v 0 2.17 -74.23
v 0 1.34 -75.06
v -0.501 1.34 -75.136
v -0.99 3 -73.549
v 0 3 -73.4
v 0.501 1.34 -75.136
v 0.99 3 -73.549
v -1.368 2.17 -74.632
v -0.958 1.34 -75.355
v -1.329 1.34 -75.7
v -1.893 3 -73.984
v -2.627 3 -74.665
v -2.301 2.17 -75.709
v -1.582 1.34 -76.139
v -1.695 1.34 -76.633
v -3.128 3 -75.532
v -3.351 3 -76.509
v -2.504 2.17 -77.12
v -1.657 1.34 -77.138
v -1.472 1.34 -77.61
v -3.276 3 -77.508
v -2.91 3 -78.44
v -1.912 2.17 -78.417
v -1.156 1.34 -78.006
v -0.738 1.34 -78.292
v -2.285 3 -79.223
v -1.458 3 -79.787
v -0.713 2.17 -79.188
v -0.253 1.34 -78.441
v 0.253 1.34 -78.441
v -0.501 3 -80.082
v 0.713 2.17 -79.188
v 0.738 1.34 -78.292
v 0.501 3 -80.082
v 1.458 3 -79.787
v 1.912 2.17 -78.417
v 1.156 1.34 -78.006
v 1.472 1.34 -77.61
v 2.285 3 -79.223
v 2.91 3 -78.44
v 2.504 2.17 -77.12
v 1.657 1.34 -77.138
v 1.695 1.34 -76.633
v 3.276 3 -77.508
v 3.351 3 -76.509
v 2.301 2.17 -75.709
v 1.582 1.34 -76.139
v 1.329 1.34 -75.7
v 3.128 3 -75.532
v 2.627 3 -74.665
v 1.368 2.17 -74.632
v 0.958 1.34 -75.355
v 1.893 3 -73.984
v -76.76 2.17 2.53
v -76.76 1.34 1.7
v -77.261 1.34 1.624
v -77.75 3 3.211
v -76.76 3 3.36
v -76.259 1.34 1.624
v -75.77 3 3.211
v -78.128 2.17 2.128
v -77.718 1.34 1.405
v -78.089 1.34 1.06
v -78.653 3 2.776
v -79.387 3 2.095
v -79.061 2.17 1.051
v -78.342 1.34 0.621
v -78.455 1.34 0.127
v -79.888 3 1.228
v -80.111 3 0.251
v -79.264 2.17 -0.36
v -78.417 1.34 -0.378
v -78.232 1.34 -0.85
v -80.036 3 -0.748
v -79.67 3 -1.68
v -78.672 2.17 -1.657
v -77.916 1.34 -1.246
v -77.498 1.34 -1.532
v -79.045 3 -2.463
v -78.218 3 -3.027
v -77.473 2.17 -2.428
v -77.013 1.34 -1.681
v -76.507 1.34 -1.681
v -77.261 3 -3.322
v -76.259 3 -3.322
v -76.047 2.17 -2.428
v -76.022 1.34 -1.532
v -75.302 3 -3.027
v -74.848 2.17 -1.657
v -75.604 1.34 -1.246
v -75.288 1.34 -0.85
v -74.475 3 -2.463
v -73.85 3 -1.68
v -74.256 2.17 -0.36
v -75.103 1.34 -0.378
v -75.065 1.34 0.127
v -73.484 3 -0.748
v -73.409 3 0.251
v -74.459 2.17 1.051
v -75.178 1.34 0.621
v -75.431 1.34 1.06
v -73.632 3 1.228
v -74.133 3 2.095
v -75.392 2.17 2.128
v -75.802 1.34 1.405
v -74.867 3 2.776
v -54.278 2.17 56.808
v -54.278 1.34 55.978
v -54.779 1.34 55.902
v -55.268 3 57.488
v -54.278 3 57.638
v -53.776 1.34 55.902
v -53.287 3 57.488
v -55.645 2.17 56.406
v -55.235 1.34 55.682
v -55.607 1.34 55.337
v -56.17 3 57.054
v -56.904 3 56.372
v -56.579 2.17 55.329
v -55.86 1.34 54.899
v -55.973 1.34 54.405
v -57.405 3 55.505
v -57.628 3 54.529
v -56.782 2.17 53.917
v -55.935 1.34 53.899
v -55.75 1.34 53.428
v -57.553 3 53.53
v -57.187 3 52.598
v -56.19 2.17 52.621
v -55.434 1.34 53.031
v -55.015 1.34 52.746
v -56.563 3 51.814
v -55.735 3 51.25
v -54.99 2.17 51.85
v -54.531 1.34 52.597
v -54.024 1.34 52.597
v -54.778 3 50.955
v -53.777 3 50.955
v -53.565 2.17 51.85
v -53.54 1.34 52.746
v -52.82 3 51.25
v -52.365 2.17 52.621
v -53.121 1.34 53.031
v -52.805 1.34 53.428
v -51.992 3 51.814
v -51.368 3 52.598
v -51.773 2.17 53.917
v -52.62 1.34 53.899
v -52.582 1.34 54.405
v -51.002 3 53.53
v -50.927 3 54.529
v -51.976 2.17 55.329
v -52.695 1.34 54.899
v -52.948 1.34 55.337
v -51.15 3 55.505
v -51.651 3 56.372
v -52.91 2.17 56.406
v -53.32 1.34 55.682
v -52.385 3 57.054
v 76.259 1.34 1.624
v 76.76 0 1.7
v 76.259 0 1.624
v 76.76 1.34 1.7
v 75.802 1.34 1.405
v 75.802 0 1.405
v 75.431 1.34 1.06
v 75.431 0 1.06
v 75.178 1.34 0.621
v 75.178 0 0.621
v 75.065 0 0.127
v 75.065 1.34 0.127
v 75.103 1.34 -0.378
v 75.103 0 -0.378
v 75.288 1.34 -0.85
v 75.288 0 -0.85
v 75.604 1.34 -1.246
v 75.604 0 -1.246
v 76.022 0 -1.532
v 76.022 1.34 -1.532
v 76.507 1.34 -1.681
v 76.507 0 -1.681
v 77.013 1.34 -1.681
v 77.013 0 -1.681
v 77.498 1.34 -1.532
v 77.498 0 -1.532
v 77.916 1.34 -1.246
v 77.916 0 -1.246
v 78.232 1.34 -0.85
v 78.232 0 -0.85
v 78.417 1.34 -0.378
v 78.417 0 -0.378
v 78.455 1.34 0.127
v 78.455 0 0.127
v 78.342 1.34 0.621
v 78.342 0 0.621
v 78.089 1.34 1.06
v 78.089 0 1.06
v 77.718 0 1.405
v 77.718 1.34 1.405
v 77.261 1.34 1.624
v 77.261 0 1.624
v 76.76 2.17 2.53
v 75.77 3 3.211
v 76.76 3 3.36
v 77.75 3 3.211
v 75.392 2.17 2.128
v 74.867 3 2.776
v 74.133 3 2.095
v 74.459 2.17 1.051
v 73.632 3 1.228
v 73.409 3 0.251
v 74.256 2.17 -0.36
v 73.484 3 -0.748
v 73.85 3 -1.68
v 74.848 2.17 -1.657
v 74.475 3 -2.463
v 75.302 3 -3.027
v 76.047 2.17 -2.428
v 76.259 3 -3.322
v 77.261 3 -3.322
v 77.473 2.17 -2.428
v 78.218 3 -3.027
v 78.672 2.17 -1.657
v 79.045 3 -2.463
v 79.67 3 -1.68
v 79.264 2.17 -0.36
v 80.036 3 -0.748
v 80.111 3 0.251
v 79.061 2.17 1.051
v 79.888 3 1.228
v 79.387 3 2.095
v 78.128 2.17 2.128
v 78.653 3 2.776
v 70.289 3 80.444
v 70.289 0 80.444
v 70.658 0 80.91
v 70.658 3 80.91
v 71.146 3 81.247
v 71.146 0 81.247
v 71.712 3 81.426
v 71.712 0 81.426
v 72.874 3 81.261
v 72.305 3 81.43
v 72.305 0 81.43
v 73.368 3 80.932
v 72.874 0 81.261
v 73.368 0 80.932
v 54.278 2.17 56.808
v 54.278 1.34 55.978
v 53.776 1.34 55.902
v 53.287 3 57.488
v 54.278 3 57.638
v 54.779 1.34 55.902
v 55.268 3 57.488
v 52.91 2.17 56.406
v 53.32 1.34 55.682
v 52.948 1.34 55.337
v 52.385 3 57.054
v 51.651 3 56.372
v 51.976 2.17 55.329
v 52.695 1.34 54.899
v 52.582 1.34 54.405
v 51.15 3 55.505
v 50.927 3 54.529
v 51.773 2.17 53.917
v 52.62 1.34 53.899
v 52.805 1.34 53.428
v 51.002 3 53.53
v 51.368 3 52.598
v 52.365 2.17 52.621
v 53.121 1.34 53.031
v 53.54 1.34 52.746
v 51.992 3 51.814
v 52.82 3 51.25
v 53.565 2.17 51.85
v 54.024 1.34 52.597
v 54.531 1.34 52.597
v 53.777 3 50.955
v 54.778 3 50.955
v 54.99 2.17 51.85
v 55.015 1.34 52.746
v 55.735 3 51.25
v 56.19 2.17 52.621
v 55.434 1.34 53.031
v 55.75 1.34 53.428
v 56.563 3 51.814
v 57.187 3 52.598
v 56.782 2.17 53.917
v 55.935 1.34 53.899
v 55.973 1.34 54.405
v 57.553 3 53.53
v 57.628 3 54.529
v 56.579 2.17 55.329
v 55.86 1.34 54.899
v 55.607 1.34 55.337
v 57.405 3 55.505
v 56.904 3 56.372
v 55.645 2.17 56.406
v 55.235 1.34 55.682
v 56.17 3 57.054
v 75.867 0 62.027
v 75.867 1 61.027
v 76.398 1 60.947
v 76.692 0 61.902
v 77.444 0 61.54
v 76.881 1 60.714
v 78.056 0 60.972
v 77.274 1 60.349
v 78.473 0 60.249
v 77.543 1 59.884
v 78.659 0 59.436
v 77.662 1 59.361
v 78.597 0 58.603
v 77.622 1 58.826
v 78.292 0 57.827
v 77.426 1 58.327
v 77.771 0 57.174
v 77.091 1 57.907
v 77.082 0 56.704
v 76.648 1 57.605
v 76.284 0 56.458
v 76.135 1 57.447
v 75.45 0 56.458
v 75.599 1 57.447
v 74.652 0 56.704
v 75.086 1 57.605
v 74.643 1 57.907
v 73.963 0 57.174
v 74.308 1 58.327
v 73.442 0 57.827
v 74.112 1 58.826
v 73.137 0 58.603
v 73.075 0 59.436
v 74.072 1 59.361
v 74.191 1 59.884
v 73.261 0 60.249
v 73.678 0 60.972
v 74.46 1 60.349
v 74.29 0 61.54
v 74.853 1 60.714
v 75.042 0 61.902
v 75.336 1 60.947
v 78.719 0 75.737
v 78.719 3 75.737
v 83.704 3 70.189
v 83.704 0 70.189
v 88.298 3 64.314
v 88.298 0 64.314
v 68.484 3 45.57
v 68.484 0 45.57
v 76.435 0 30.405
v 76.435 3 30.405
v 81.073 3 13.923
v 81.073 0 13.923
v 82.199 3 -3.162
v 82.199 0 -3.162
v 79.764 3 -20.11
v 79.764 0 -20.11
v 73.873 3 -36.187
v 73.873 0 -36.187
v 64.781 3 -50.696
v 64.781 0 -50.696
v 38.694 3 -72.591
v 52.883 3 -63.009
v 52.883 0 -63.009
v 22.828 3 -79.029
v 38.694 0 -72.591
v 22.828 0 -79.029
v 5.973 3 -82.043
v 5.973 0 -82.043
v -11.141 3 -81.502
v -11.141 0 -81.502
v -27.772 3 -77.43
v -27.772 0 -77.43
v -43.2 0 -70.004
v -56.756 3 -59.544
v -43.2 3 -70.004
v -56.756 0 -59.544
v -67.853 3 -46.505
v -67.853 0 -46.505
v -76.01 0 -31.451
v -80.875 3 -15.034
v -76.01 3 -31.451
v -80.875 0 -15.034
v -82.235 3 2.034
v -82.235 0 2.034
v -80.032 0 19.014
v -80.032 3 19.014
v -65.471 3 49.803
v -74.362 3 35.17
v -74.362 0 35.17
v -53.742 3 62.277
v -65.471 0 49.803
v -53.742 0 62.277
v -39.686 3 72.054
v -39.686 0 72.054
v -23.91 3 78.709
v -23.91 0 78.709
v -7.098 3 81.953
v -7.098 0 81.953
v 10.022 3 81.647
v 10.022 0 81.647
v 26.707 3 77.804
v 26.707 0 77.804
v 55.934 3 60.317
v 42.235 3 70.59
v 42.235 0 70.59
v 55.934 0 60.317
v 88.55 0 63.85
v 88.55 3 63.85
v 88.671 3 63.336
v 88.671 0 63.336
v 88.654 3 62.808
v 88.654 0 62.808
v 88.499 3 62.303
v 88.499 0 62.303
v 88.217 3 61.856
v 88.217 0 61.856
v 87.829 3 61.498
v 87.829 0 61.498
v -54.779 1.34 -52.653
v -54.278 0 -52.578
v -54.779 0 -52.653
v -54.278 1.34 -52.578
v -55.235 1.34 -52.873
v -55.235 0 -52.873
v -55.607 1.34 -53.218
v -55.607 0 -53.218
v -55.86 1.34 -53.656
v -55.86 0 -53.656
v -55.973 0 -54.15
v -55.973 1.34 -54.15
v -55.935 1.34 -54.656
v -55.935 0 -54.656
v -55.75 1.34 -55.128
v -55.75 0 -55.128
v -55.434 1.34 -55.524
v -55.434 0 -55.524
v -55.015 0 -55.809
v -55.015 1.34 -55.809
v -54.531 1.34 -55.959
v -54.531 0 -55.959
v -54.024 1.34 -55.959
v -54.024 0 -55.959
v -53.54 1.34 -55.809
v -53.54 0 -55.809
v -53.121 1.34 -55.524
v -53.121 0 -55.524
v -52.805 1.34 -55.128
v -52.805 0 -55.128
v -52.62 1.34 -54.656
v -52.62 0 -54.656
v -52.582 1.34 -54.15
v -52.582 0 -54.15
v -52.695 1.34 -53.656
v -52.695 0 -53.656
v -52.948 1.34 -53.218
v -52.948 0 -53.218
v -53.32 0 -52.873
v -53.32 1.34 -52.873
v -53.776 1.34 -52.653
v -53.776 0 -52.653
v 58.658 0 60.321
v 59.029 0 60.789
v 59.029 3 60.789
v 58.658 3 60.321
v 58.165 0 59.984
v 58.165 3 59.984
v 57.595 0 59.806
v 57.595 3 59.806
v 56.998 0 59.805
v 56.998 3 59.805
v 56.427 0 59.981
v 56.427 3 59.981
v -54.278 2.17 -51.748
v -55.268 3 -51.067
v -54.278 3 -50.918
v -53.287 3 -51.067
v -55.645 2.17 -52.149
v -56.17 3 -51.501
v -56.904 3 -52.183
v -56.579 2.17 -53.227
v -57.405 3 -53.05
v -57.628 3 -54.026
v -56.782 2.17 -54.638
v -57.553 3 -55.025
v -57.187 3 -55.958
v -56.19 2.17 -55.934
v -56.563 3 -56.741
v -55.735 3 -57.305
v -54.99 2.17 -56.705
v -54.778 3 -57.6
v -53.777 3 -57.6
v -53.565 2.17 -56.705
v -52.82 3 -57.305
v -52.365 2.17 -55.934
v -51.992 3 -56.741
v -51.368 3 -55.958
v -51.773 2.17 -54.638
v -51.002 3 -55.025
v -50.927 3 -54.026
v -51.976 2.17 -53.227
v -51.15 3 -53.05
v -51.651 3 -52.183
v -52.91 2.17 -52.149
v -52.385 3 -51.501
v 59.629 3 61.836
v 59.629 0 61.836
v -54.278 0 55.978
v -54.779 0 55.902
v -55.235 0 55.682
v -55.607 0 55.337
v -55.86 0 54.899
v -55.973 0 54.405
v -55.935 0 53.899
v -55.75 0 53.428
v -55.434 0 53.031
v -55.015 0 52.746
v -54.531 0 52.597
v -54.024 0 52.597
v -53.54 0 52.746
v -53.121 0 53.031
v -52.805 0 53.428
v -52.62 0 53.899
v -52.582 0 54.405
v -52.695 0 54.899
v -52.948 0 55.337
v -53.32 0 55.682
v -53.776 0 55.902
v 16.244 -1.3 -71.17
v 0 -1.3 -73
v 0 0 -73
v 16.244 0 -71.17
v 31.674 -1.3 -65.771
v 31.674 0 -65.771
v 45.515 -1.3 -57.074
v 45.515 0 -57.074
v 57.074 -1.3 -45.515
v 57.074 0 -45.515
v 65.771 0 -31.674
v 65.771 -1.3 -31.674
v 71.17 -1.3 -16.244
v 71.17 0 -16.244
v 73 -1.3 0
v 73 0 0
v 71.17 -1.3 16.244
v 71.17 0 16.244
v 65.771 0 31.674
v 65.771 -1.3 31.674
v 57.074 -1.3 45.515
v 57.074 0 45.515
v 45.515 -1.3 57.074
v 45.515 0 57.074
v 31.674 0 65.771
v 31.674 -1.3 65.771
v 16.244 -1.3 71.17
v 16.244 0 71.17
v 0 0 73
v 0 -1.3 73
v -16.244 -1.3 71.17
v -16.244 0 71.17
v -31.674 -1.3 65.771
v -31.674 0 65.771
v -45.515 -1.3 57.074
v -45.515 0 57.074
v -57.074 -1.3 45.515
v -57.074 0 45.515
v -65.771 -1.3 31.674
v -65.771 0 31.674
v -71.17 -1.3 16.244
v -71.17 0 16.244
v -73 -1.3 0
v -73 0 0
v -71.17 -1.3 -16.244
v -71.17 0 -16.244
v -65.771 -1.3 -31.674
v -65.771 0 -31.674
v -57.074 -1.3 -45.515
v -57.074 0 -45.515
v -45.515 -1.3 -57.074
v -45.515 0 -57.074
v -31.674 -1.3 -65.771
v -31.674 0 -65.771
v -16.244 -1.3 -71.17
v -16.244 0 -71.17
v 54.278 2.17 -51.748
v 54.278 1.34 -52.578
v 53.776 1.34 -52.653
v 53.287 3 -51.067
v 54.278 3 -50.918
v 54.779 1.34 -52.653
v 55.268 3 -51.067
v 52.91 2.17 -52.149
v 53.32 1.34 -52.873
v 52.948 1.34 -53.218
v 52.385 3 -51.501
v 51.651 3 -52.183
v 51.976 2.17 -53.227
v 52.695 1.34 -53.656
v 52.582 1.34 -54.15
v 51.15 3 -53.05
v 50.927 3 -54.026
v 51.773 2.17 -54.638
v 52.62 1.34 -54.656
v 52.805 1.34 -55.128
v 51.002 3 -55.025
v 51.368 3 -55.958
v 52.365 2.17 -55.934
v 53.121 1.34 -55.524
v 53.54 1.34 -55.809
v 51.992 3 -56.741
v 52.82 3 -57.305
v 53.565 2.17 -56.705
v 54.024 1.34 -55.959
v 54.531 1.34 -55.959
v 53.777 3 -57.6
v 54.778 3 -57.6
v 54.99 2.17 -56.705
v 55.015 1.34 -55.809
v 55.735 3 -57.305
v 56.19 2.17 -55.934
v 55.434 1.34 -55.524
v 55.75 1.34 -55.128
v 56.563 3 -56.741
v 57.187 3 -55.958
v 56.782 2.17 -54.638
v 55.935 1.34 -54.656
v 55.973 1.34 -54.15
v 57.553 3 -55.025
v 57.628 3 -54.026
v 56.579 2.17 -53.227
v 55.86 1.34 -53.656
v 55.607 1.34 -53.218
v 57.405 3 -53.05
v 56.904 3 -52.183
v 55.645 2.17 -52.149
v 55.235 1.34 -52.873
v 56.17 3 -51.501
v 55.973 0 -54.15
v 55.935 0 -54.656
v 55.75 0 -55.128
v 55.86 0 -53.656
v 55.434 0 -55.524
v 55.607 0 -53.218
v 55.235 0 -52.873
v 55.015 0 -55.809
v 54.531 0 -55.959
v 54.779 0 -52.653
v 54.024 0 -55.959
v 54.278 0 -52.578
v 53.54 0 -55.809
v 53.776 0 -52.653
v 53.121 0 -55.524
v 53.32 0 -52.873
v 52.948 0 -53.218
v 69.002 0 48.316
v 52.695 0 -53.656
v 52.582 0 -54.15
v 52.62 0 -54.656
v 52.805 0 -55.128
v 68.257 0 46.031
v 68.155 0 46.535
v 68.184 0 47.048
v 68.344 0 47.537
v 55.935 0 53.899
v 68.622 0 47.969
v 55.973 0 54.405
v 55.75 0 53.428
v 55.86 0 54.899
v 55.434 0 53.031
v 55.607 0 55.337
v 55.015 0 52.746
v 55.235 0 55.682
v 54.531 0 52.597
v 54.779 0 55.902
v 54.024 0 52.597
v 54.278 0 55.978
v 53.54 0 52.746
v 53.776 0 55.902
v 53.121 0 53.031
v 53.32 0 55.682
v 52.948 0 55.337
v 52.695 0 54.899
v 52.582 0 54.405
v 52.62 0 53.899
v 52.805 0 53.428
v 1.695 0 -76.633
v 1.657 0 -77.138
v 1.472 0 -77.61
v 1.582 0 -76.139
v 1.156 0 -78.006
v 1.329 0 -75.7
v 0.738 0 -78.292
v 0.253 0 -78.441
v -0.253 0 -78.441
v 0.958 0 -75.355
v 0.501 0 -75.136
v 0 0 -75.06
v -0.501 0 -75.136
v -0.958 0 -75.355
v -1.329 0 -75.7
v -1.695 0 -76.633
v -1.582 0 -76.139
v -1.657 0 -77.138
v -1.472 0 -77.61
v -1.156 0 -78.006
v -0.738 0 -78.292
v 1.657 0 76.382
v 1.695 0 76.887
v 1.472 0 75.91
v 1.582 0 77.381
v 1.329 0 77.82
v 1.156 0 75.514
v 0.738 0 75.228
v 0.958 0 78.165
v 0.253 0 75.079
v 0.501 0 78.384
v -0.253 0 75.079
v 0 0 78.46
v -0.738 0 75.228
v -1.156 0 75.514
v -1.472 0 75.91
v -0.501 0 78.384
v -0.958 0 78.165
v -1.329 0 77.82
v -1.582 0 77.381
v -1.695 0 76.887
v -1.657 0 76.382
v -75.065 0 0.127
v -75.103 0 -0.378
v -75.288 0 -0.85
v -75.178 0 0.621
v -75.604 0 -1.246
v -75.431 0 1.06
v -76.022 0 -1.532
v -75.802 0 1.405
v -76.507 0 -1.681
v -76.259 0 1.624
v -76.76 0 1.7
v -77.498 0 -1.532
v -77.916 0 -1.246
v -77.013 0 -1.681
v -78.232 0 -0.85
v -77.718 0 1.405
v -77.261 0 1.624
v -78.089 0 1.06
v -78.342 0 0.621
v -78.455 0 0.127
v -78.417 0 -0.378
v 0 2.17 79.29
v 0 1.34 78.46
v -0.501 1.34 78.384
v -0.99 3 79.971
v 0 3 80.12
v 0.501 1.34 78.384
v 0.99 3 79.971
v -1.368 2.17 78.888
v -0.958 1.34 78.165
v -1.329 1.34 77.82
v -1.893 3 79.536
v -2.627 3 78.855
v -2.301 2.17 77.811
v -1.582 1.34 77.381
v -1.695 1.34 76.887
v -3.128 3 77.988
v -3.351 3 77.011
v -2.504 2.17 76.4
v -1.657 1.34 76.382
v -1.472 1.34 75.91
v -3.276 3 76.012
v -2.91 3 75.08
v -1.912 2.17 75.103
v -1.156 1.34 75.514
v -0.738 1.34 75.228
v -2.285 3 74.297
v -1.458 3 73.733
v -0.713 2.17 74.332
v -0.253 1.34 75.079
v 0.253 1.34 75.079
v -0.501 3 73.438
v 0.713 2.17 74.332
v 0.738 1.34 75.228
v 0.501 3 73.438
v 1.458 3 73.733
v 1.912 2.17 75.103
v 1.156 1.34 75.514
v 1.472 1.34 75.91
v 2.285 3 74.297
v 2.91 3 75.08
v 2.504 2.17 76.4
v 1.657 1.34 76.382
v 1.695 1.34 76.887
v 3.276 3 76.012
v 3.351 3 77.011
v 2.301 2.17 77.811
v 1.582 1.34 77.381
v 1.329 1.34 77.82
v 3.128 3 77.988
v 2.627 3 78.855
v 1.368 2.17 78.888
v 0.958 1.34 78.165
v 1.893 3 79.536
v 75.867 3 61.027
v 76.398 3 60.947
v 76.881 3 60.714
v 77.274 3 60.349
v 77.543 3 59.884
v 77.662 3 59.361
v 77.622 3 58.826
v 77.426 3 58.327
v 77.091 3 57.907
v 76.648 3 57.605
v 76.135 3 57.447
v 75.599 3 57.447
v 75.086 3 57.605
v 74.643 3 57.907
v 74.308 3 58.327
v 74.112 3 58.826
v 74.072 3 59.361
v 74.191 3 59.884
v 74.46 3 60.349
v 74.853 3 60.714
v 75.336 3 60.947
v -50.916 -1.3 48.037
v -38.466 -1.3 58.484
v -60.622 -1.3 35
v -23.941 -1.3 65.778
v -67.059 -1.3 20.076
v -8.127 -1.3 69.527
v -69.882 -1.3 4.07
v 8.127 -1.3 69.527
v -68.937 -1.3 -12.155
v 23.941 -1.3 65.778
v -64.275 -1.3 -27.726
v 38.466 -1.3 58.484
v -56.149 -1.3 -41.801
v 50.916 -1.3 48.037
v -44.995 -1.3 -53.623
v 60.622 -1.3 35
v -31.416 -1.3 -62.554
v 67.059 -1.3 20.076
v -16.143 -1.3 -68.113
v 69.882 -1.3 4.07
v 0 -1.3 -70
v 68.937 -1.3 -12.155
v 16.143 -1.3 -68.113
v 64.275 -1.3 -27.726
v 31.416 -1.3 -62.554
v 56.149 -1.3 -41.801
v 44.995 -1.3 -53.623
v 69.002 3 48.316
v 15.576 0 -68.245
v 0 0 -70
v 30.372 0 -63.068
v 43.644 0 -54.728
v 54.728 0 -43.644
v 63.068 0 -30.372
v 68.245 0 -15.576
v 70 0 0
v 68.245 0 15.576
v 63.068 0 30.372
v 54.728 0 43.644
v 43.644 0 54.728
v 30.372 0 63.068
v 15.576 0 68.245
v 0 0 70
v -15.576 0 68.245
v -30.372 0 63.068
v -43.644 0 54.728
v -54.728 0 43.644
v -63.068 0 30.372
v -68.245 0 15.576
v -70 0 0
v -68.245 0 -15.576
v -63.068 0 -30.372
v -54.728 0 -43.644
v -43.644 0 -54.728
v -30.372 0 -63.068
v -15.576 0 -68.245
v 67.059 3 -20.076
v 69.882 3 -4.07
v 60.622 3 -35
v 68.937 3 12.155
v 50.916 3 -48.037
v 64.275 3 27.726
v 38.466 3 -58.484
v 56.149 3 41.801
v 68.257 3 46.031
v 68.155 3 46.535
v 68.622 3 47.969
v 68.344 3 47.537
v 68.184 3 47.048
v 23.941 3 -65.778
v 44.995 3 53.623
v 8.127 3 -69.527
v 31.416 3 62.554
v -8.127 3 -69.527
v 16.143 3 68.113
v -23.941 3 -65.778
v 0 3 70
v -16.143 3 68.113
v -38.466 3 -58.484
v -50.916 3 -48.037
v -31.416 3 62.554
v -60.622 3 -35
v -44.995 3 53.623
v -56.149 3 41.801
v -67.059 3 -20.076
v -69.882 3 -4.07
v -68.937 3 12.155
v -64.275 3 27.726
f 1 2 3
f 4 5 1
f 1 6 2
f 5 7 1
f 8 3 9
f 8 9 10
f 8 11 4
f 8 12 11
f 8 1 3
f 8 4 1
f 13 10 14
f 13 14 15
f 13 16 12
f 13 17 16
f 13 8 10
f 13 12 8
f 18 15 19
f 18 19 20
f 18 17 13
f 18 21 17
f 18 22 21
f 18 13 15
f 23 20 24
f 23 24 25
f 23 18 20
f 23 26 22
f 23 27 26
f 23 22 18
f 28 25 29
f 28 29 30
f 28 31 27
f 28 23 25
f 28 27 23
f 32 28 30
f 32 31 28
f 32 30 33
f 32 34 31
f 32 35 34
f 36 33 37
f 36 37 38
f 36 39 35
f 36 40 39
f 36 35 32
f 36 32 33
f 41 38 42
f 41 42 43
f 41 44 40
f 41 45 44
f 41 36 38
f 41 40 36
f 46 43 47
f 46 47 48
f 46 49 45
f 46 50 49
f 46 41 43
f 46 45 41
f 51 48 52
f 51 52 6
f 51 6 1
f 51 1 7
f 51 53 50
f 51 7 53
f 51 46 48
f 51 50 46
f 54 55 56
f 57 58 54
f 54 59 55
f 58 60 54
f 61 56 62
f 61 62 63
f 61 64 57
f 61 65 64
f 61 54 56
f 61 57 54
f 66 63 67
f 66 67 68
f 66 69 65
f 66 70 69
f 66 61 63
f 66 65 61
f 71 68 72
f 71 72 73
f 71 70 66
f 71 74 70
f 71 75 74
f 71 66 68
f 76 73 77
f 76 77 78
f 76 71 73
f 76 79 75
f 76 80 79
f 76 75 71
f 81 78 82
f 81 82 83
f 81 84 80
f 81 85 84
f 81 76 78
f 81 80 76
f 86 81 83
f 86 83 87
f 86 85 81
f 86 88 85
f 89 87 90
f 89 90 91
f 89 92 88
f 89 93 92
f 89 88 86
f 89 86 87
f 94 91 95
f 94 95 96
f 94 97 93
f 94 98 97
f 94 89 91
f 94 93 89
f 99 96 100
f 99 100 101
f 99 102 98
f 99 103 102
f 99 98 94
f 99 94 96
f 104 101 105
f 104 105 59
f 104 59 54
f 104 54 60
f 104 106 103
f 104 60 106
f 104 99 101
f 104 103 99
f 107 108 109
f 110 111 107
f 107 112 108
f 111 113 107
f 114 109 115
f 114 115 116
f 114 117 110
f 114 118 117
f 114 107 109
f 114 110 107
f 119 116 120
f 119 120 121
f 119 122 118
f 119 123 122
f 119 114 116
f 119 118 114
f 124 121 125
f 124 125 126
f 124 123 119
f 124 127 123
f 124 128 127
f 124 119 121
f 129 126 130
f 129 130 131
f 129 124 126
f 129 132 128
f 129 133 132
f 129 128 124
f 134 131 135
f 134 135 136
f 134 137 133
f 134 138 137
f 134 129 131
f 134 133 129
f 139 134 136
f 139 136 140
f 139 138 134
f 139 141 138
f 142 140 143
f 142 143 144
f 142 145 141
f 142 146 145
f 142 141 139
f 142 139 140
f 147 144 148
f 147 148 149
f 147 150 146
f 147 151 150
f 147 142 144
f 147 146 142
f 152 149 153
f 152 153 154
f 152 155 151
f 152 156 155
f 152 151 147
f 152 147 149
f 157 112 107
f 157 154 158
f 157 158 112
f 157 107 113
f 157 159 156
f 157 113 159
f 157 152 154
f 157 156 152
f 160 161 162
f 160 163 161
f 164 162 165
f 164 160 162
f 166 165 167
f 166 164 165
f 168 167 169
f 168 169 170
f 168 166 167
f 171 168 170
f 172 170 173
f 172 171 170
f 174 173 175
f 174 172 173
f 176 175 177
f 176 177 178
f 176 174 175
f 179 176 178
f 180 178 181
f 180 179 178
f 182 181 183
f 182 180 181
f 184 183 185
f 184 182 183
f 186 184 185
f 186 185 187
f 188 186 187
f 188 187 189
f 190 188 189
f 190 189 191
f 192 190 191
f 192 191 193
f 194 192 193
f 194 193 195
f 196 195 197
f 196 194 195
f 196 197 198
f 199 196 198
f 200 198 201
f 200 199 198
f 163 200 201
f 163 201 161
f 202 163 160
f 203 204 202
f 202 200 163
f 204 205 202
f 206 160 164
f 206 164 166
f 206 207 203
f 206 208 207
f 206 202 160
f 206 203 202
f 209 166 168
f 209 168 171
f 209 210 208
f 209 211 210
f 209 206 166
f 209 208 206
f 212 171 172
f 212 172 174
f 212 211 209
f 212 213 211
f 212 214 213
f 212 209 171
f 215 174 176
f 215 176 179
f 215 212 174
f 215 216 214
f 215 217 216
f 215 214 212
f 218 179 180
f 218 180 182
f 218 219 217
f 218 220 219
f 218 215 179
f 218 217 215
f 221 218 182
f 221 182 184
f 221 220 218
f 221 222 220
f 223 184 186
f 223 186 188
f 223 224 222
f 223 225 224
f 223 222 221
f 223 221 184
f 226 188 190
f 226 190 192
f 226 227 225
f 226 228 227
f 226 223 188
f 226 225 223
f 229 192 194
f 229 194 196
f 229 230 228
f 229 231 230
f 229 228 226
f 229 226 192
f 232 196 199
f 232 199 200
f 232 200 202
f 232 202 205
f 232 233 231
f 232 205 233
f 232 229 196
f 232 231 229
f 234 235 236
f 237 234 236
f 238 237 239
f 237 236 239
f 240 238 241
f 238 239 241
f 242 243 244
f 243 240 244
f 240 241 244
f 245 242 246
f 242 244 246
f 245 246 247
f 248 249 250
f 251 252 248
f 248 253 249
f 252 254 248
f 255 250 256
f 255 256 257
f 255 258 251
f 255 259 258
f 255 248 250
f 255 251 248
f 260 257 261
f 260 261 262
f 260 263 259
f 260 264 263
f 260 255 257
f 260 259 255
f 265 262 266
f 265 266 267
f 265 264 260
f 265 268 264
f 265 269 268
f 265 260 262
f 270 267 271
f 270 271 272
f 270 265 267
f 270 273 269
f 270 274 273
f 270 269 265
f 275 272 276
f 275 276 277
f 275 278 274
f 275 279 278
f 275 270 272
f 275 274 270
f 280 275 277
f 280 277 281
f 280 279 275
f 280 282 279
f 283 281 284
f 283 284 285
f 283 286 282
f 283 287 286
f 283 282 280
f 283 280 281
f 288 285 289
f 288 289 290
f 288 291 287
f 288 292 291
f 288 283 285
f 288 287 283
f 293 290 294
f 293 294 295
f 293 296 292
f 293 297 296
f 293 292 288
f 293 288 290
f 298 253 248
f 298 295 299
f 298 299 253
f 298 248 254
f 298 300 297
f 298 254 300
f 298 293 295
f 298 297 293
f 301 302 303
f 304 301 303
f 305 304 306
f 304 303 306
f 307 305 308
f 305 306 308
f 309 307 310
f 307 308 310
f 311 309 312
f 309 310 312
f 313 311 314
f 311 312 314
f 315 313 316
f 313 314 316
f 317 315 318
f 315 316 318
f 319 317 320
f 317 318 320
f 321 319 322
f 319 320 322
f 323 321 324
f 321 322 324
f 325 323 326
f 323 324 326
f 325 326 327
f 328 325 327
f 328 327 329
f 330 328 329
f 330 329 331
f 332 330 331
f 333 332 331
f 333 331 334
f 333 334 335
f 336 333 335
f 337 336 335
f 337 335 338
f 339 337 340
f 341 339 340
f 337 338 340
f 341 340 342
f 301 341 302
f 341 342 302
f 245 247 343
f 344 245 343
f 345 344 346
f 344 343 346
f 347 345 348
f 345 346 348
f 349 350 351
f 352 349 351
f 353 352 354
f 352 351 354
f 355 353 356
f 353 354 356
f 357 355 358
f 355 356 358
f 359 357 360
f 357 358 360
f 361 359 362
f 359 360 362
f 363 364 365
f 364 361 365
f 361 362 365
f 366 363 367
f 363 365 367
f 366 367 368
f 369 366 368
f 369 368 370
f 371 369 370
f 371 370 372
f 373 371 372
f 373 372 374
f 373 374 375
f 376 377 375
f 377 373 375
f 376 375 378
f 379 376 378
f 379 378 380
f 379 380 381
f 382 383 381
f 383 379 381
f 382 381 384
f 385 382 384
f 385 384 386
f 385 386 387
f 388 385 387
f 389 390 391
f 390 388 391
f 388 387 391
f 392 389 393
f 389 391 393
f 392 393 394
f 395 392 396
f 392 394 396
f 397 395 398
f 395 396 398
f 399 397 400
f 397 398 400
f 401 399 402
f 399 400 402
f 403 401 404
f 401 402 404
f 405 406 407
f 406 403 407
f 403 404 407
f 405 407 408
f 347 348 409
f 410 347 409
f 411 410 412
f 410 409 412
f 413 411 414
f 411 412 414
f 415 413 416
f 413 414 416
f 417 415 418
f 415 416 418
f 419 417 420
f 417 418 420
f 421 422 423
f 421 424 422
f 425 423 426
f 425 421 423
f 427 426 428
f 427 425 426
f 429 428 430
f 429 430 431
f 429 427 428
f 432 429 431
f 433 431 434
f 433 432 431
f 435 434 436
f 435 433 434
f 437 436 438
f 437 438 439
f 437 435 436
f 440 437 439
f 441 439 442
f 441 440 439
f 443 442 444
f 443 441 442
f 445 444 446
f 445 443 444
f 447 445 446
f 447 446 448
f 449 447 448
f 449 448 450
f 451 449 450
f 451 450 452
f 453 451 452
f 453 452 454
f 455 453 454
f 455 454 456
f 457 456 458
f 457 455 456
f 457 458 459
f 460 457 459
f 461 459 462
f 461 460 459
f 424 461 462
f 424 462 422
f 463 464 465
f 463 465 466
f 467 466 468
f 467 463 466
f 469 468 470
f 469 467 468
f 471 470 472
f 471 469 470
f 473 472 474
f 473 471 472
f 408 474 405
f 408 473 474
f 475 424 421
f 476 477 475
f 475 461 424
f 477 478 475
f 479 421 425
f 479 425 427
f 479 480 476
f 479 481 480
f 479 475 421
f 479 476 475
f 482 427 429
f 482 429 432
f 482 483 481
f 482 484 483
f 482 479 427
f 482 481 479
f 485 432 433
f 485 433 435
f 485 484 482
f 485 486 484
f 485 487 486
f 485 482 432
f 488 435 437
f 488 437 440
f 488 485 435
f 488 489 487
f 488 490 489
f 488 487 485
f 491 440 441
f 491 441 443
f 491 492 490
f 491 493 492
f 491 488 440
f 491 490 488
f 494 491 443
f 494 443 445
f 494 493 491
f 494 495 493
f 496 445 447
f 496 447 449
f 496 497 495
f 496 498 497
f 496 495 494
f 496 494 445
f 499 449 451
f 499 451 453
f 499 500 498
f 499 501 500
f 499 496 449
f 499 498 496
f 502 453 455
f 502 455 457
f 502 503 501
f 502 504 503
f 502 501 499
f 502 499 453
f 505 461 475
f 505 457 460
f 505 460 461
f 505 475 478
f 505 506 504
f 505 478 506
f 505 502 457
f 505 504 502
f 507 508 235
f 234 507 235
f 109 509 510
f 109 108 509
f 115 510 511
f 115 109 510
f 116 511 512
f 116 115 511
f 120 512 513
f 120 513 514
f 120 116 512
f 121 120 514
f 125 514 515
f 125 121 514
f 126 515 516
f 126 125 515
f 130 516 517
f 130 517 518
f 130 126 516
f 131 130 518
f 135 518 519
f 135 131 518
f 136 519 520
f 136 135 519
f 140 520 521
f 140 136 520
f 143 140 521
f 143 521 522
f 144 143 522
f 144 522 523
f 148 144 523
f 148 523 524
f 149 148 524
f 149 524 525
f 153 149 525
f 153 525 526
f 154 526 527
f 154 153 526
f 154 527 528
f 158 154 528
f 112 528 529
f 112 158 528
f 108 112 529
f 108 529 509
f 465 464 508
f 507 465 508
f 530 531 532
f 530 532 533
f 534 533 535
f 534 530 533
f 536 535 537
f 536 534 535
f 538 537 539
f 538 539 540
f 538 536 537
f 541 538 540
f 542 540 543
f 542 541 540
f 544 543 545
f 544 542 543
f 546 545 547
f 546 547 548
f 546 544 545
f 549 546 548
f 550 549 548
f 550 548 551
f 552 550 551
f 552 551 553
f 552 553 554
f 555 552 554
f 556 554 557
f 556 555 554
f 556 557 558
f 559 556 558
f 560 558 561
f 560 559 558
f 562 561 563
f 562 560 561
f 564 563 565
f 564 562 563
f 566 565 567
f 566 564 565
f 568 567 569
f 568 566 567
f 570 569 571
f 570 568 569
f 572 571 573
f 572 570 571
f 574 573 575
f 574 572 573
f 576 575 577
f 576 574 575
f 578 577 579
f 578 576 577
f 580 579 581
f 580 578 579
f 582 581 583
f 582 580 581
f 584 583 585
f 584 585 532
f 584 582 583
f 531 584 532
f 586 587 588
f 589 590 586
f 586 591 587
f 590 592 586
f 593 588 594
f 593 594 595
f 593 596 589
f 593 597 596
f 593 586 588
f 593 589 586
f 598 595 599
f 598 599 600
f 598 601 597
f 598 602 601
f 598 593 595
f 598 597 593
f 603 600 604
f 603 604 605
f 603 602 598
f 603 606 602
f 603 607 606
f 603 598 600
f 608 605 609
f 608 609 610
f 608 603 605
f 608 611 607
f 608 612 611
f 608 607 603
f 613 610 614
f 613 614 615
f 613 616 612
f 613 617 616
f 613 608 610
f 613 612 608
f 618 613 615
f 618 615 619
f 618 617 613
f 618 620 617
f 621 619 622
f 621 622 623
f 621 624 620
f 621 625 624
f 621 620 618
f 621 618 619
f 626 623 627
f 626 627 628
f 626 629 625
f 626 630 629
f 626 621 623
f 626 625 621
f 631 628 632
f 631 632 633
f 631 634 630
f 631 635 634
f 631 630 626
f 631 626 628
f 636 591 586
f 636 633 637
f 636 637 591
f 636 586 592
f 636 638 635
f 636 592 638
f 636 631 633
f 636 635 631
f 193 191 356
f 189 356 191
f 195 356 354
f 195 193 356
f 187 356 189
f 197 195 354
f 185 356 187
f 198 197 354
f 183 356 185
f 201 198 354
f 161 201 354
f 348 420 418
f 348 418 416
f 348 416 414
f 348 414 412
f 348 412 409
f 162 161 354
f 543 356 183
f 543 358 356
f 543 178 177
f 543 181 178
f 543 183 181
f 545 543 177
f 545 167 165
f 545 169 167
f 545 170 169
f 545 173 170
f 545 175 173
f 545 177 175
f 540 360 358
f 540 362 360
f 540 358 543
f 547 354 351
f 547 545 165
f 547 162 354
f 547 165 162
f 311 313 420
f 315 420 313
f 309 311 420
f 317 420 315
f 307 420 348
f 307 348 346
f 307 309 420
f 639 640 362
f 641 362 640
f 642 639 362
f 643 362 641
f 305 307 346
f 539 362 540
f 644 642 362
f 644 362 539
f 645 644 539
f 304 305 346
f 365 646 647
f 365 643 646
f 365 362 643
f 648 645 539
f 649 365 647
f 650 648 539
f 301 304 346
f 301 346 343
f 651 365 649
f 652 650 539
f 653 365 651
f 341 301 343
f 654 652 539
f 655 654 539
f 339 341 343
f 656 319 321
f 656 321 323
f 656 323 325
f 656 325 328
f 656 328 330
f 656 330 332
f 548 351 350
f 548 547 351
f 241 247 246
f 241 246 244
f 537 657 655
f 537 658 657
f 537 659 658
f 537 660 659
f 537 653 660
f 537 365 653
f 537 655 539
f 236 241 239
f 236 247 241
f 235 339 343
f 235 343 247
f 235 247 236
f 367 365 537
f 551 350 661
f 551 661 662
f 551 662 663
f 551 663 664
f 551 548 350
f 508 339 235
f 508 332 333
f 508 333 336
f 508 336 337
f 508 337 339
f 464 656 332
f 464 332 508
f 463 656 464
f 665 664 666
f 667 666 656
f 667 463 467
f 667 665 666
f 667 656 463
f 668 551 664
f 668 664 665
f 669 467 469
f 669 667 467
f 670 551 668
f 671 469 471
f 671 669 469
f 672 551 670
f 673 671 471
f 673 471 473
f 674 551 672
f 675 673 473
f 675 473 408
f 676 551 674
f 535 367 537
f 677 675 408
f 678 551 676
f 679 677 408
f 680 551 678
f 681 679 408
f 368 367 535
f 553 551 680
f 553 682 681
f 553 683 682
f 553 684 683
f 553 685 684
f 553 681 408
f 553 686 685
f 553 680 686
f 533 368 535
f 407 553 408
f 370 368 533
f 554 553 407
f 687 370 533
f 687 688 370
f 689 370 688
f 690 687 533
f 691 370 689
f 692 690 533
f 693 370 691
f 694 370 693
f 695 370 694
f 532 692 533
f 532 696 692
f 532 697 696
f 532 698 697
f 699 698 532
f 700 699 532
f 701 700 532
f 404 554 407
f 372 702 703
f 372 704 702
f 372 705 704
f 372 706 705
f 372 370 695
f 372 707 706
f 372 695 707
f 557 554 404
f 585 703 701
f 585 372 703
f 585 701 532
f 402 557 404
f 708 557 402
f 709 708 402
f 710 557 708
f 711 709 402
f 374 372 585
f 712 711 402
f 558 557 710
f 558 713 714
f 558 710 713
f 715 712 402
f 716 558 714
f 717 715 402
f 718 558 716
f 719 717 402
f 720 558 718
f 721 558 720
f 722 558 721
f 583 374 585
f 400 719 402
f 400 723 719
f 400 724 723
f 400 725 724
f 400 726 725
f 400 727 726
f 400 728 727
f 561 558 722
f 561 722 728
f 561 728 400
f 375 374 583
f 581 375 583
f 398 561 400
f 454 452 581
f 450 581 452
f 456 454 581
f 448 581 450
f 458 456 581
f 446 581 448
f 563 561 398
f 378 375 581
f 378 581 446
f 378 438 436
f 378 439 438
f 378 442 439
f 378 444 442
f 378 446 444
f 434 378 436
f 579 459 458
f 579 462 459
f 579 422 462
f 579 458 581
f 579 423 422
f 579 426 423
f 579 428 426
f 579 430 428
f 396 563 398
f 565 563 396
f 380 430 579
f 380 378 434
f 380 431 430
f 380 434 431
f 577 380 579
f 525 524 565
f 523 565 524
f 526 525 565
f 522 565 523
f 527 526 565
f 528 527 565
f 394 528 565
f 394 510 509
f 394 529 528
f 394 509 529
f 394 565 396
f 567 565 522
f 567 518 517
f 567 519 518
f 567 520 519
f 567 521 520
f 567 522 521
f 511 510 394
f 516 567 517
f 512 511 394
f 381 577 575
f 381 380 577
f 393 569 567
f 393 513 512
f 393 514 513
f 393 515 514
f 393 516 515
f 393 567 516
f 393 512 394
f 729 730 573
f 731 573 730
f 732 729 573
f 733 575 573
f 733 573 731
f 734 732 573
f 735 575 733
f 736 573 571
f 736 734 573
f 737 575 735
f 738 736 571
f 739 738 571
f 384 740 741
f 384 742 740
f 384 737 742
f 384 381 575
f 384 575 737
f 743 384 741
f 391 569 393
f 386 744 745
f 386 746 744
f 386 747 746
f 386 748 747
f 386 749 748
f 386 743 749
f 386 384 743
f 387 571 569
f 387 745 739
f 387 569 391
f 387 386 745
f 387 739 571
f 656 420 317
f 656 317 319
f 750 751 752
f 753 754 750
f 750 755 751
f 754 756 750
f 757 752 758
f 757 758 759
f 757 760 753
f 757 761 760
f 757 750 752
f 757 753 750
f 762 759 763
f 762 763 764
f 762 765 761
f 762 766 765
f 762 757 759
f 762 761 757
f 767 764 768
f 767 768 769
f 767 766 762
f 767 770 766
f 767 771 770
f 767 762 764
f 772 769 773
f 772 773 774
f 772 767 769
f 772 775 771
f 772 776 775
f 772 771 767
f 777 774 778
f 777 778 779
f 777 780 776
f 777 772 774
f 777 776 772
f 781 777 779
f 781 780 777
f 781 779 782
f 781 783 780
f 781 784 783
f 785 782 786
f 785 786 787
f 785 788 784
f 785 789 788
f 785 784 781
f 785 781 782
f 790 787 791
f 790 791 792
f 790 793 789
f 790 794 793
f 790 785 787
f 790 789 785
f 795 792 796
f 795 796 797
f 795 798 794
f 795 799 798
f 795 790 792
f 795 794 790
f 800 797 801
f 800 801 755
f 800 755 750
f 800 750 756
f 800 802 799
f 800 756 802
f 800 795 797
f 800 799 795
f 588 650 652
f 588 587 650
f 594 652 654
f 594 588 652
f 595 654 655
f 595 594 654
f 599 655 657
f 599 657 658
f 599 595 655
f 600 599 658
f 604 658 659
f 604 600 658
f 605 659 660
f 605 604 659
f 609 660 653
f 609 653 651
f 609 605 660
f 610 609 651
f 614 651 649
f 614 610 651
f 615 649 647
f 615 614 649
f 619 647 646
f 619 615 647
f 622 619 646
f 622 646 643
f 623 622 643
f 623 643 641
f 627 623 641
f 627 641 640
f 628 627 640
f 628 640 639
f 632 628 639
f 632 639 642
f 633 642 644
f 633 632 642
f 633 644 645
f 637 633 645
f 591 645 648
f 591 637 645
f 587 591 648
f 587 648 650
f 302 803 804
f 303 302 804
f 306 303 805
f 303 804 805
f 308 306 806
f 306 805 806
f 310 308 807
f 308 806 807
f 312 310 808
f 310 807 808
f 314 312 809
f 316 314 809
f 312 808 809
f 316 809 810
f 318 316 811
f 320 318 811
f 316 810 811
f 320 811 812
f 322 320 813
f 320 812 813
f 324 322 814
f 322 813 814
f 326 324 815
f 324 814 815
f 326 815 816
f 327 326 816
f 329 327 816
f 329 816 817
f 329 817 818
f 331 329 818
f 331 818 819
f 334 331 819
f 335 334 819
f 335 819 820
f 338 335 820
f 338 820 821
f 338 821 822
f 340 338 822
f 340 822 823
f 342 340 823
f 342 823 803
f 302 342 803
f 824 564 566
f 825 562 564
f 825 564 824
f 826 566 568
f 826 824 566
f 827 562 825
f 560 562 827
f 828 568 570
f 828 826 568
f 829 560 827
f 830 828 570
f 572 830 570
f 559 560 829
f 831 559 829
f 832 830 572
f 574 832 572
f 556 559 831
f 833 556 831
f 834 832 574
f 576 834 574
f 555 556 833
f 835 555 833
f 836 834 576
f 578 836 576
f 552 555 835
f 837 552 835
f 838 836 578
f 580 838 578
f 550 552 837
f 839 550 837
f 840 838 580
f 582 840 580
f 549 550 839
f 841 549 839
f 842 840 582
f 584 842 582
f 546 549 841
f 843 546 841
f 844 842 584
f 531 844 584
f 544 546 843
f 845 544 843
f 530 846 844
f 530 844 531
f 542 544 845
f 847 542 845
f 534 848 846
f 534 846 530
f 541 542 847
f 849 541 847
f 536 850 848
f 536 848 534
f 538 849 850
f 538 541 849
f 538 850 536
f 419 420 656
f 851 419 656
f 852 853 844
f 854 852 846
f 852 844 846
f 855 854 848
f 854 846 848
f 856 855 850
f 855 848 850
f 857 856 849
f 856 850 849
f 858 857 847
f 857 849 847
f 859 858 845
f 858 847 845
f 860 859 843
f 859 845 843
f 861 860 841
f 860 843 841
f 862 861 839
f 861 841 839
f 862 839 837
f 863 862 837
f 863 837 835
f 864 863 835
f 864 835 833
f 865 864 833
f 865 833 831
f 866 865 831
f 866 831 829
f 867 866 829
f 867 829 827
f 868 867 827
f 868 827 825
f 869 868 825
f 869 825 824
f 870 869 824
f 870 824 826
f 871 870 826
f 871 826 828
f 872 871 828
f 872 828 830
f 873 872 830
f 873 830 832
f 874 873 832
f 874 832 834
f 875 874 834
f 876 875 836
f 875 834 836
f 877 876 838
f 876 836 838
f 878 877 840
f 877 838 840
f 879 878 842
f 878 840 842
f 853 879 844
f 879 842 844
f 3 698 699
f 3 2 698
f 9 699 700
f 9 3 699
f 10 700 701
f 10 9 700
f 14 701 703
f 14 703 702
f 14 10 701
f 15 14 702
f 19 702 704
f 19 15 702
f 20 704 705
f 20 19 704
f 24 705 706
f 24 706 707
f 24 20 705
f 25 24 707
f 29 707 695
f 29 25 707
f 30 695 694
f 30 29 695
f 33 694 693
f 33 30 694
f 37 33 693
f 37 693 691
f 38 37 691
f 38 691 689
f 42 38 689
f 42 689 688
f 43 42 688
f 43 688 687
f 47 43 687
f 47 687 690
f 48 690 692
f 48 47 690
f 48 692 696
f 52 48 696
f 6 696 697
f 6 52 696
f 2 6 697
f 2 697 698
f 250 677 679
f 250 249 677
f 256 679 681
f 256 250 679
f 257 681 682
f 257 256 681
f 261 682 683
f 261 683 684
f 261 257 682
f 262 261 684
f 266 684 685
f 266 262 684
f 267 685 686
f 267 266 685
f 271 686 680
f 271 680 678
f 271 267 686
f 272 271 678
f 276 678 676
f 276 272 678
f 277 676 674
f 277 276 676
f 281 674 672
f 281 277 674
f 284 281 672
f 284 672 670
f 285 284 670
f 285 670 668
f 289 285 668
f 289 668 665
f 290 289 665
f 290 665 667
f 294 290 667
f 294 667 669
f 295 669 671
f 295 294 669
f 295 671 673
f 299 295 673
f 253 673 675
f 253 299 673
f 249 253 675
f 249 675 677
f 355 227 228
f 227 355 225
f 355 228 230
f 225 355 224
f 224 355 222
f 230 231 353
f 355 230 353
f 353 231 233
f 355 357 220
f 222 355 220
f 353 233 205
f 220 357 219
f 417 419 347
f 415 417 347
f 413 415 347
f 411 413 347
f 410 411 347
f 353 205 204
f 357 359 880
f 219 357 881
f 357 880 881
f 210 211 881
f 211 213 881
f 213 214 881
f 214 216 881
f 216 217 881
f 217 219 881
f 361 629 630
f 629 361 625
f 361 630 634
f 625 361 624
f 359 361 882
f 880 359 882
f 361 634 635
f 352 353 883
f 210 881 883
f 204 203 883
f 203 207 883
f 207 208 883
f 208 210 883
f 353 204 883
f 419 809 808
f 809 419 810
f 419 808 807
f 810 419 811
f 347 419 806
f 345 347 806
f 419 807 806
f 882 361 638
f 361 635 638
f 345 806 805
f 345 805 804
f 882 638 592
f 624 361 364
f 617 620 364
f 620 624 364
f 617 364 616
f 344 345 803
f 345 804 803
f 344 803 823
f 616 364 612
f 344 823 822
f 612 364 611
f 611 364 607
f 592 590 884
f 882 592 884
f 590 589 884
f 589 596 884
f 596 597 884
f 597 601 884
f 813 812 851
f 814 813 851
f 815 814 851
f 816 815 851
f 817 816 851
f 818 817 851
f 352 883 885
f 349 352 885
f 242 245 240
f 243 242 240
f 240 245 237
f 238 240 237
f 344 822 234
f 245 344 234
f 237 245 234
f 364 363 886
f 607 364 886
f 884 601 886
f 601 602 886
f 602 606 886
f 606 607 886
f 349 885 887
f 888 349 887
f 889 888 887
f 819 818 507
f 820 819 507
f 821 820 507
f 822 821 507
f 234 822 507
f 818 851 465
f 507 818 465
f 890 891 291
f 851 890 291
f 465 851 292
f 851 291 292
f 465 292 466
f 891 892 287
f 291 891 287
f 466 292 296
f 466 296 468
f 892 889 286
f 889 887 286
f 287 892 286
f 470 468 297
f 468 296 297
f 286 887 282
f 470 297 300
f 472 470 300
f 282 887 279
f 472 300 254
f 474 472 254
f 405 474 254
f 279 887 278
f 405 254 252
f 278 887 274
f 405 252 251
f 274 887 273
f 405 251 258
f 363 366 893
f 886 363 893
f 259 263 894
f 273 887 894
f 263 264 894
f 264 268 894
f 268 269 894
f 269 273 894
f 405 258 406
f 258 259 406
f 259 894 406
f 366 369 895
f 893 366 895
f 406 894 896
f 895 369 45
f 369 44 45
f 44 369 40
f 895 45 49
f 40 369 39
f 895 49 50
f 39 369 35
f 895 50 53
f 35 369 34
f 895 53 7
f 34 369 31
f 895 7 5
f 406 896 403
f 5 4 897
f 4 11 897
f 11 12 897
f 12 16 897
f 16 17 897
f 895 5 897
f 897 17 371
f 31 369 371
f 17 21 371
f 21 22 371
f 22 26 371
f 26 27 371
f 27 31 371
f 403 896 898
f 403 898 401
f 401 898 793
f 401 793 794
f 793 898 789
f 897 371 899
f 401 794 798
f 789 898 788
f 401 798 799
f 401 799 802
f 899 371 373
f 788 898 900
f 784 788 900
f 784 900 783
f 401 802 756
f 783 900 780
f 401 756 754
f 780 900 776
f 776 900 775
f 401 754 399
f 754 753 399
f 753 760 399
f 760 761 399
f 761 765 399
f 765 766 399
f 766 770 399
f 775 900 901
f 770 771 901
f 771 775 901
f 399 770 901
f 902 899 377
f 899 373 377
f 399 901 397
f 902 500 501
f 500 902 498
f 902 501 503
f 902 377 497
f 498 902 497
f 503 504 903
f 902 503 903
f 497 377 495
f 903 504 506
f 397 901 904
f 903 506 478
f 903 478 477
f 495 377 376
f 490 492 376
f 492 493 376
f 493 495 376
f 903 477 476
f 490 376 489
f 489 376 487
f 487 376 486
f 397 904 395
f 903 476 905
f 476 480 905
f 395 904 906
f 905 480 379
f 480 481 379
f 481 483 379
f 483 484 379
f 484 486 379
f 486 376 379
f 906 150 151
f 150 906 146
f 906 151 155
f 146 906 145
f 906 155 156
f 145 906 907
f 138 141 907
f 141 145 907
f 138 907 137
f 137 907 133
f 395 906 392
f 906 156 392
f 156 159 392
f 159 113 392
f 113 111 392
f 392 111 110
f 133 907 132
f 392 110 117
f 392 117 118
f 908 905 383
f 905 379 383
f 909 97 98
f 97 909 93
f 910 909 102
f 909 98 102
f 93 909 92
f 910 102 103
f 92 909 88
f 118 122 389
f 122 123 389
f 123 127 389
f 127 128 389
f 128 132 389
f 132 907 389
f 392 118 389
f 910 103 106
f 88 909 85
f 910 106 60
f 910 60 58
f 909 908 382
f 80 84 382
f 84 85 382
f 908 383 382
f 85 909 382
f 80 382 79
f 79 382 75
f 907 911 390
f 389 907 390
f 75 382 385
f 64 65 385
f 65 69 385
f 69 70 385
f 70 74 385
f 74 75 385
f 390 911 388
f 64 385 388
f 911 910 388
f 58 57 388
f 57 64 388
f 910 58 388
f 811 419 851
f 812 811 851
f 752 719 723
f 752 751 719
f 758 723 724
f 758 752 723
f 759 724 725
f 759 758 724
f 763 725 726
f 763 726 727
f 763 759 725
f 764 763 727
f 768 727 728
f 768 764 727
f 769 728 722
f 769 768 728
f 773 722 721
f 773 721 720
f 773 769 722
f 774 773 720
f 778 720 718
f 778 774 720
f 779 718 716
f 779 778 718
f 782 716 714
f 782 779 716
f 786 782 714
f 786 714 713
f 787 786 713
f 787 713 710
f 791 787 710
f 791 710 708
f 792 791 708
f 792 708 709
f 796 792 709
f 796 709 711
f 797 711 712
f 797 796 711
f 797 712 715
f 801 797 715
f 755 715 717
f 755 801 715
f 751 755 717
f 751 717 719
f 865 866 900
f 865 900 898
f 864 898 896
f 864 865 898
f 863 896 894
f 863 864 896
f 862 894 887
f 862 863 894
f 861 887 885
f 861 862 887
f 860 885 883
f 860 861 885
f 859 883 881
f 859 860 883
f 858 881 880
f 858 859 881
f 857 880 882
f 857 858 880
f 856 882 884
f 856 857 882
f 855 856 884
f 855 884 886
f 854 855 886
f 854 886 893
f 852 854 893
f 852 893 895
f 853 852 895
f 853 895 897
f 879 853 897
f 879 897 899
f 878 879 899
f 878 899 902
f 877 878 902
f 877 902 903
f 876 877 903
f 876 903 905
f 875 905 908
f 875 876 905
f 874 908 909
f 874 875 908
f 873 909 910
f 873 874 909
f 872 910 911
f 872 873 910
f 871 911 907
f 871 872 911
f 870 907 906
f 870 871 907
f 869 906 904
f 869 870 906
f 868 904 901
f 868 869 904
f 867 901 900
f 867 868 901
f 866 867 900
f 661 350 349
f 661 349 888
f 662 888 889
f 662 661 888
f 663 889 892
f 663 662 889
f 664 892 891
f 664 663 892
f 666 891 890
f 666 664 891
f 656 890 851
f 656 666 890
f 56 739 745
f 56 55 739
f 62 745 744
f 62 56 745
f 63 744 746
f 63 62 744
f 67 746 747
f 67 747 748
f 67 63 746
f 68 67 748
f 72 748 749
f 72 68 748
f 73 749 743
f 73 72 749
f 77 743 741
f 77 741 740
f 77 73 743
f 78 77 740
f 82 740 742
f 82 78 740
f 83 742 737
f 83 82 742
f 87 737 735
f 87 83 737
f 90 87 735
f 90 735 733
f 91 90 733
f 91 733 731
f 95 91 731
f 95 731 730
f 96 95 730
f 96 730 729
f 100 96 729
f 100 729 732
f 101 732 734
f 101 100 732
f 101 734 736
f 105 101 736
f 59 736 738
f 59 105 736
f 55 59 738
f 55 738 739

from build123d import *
from build123d.topology import SkipClean

# Parameters (mm, degrees)
ESBO_O1_R                                    = 82.26
ESBO_O1_R_2                                  = 70
RESSALTO_EXTRUS_O1_DEPTH                     = 3
RESSALTO_EXTRUS_O2_START                     = 1.3
ESBO_O2_R                                    = 73
ESBO_O2_R_2                                  = 70
RESSALTO_EXTRUS_O2_DEPTH                     = 1.3
ESCAREADO_PARA_PARAFUSO_ALLEN_SEXTAV_2_COUNT = 2
ESCAREADO_PARA_PARAFUSO_ALLEN_SEXTAV_2_PITCH = 76.76
ESCAREADO_PARA_PARAFUSO_ALLEN_SEXTAV_3_COUNT = 2
ESCAREADO_PARA_PARAFUSO_ALLEN_SEXTAV_3_PITCH = 76.76
ESCAREADO_PARA_PARAFUSO_ALLEN_SEXTAV_4_COUNT = 2
ESCAREADO_PARA_PARAFUSO_ALLEN_SEXTAV_4_PITCH = 76.76
ESCAREADO_PARA_PARAFUSO_ALLEN_SEXTAV_5_COUNT = 2
ESCAREADO_PARA_PARAFUSO_ALLEN_SEXTAV_5_PITCH = 76.76
ESCAREADO_PARA_PARAFUSO_ALLEN_SEXTAV_6_COUNT = 2
ESCAREADO_PARA_PARAFUSO_ALLEN_SEXTAV_6_PITCH = 76.76
ESCAREADO_PARA_PARAFUSO_ALLEN_SEXTAV_7_COUNT = 2
ESCAREADO_PARA_PARAFUSO_ALLEN_SEXTAV_7_PITCH = 76.76
ESCAREADO_PARA_PARAFUSO_ALLEN_SEXTAV_8_COUNT = 2
ESCAREADO_PARA_PARAFUSO_ALLEN_SEXTAV_8_PITCH = 76.76
ESCAREADO_PARA_PARAFUSO_ALLEN_SEXTAV_9_COUNT = 2
ESCAREADO_PARA_PARAFUSO_ALLEN_SEXTAV_9_PITCH = 76.76
RESSALTO_EXTRUS_O3_START                     = -3
RESSALTO_EXTRUS_O3_DEPTH                     = 3
FILETE1_R                                    = 2
ESBO_O9_R                                    = 1.8
CORTE_EXTRUS_O3_DEPTH                        = 122.035496877
CHANFRO2_SIZE                                = 1


with BuildPart() as part:
    # Esboço1 → Ressalto-extrusão1 (new body)
    with BuildSketch(Plane(origin=(0, 0, 0), x_dir=(1, 0, 0), z_dir=(0, 1, 0))):
        with Locations(Location((0, 0, 0), (0, 0, 270))):
            Circle(ESBO_O1_R)
        with Locations(Location((0, 0, 0), (0, 0, 270))):
            Circle(ESBO_O1_R_2, mode=Mode.SUBTRACT)
    extrude(amount=RESSALTO_EXTRUS_O1_DEPTH)

    # Esboço2 → Ressalto-extrusão2 (add)
    with SkipClean():  # the faces are left unmerged after this step: merging them gives an invalid solid
        with BuildSketch(Plane.XZ.offset(RESSALTO_EXTRUS_O2_START)):
            with Locations(Location((0, 0, 0), (0, 0, 270))):
                Circle(ESBO_O2_R)
            with Locations(Location((0, 0, 0), (0, 0, 270))):
                Circle(ESBO_O2_R_2, mode=Mode.SUBTRACT)
        extrude(amount=-RESSALTO_EXTRUS_O2_DEPTH)

    # Esboço4 → Escareado para parafuso Allen sextavado escareado de M31 (revolve, cut)
    with SkipClean():  # the faces are left unmerged after this step: merging them gives an invalid solid
        with BuildSketch(Plane(origin=(0, 3, 0), x_dir=(0, 0, 1), z_dir=(1, 0, 0))):
            Polygon((0, 0), (0, 3), (1.7, 3), (1.7, 1.66), (3.36, 0), align=None)
        escareado_para_parafuso_allen_sextavado = revolve(axis=Axis((0, 9.35, 0), (0, -1, 0)), mode=Mode.SUBTRACT)

    # Escareado para parafuso Allen sextav 2: Escareado para parafuso Allen sextavado escareado de M31 ×2
    with SkipClean():  # the faces are left unmerged after this step: merging them gives an invalid solid
        with Locations(*[(-i * ESCAREADO_PARA_PARAFUSO_ALLEN_SEXTAV_2_PITCH, 0, 0) for i in range(1, ESCAREADO_PARA_PARAFUSO_ALLEN_SEXTAV_2_COUNT)]):
            add(escareado_para_parafuso_allen_sextavado, mode=Mode.SUBTRACT)

    # Escareado para parafuso Allen sextav 3: Escareado para parafuso Allen sextavado escareado de M31 ×2
    with SkipClean():  # the faces are left unmerged after this step: merging them gives an invalid solid
        with Locations(*[Vector(-0.7071067811865477, 0, -0.7071067811865475) * (i * ESCAREADO_PARA_PARAFUSO_ALLEN_SEXTAV_3_PITCH) for i in range(1, ESCAREADO_PARA_PARAFUSO_ALLEN_SEXTAV_3_COUNT)]):
            add(escareado_para_parafuso_allen_sextavado, mode=Mode.SUBTRACT)

    # Escareado para parafuso Allen sextav 4: Escareado para parafuso Allen sextavado escareado de M31 ×2
    with SkipClean():  # the faces are left unmerged after this step: merging them gives an invalid solid
        with Locations(*[(0, 0, -i * ESCAREADO_PARA_PARAFUSO_ALLEN_SEXTAV_4_PITCH) for i in range(1, ESCAREADO_PARA_PARAFUSO_ALLEN_SEXTAV_4_COUNT)]):
            add(escareado_para_parafuso_allen_sextavado, mode=Mode.SUBTRACT)

    # Escareado para parafuso Allen sextav 5: Escareado para parafuso Allen sextavado escareado de M31 ×2
    with SkipClean():  # the faces are left unmerged after this step: merging them gives an invalid solid
        with Locations(*[Vector(0.7071067811865475, 0, -0.7071067811865476) * (i * ESCAREADO_PARA_PARAFUSO_ALLEN_SEXTAV_5_PITCH) for i in range(1, ESCAREADO_PARA_PARAFUSO_ALLEN_SEXTAV_5_COUNT)]):
            add(escareado_para_parafuso_allen_sextavado, mode=Mode.SUBTRACT)

    # Escareado para parafuso Allen sextav 6: Escareado para parafuso Allen sextavado escareado de M31 ×2
    with SkipClean():  # the faces are left unmerged after this step: merging them gives an invalid solid
        with Locations(*[(i * ESCAREADO_PARA_PARAFUSO_ALLEN_SEXTAV_6_PITCH, 0, 0) for i in range(1, ESCAREADO_PARA_PARAFUSO_ALLEN_SEXTAV_6_COUNT)]):
            add(escareado_para_parafuso_allen_sextavado, mode=Mode.SUBTRACT)

    # Escareado para parafuso Allen sextav 7: Escareado para parafuso Allen sextavado escareado de M31 ×2
    with SkipClean():  # the faces are left unmerged after this step: merging them gives an invalid solid
        with Locations(*[Vector(0.7071067811865477, 0, 0.7071067811865475) * (i * ESCAREADO_PARA_PARAFUSO_ALLEN_SEXTAV_7_PITCH) for i in range(1, ESCAREADO_PARA_PARAFUSO_ALLEN_SEXTAV_7_COUNT)]):
            add(escareado_para_parafuso_allen_sextavado, mode=Mode.SUBTRACT)

    # Escareado para parafuso Allen sextav 8: Escareado para parafuso Allen sextavado escareado de M31 ×2
    with SkipClean():  # the faces are left unmerged after this step: merging them gives an invalid solid
        with Locations(*[(0, 0, i * ESCAREADO_PARA_PARAFUSO_ALLEN_SEXTAV_8_PITCH) for i in range(1, ESCAREADO_PARA_PARAFUSO_ALLEN_SEXTAV_8_COUNT)]):
            add(escareado_para_parafuso_allen_sextavado, mode=Mode.SUBTRACT)

    # Escareado para parafuso Allen sextav 9: Escareado para parafuso Allen sextavado escareado de M31 ×2
    with SkipClean():  # the faces are left unmerged after this step: merging them gives an invalid solid
        with Locations(*[Vector(-0.7071067811865475, 0, 0.7071067811865476) * (i * ESCAREADO_PARA_PARAFUSO_ALLEN_SEXTAV_9_PITCH) for i in range(1, ESCAREADO_PARA_PARAFUSO_ALLEN_SEXTAV_9_COUNT)]):
            add(escareado_para_parafuso_allen_sextavado, mode=Mode.SUBTRACT)

    # Esboço5 → Ressalto-extrusão3 (add)
    with SkipClean():  # the faces are left unmerged after this step: merging them gives an invalid solid
        with BuildSketch(Plane(origin=(0, 3, 0), x_dir=(1, 0, 0), z_dir=(0, 1, 0)).offset(RESSALTO_EXTRUS_O3_START)):
            with BuildLine():
                Line((59.628675028, -61.836305796), (71.511245178, -82.577126452))
                ThreePointArc((71.511245178, -82.577126452), (81.110607536, -73.170413044), (89.482153659, -62.656078528))
                Line((89.482153659, -62.656078528), (67.383447163, -47.182397654))
                ThreePointArc((67.383447163, -47.182397654), (62.829570926, -53.09569302), (57.758469462, -58.57189433))
                Line((57.758469462, -58.57189433), (59.628675028, -61.836305796))
            make_face()
        extrude(amount=RESSALTO_EXTRUS_O3_DEPTH)
    add(part.part.scale(1), mode=Mode.REPLACE)  # the faces are merged on a copy

    # Filete1
    # the kernel refuses this fillet: 2 mm, written as the material it adds along each edge
    with BuildSketch(Plane(origin=(57.758469462, 0, 58.57189433), x_dir=(-0.7227263558173935, 0, 0.6911342956379103), z_dir=(0, 1, 0))) as filete1_piece_1:
        with BuildLine():
            CenterArc((2.55574236, 1.999764426), FILETE1_R, 166.088750143, 103.031841977)
            Line((0.61440377, 2.480601697), (0, 0))
            ThreePointArc((0, 0), (1.26252322, 0.009689149), (2.525046439, 0))
        make_face()
    extrude(amount=3)
    with BuildSketch(Plane(origin=(67.383447163, 0, 47.182397654), x_dir=(0.5638136312570139, 0, -0.8259020457710344), z_dir=(0, 1, 0))) as filete1_piece_2:
        with BuildLine():
            CenterArc((1.976403158, -1.999859125), FILETE1_R, 90.680051756, 88.639896488)
            Line((-0.023455967, -1.976121398), (0, 0))
            ThreePointArc((0, 0), (0.976332715, -0.005794184), (1.952665431, 0))
        make_face()
    extrude(amount=3)
    # the kernel refuses this fillet: 2 mm, written as the material it takes off along each edge
    with BuildSketch(Plane(origin=(89.482153659, -5.093472409, 62.656078528), x_dir=(-0.5811904962497088, 0, 0.8137675387166886), z_dir=(0, 1, 0))) as filete1_2_piece_1:
        with BuildLine():
            CenterArc((2.018737967, -1.999913033), FILETE1_R, 89.465680564, 91.068638872)
            Line((0.018824934, -2.01856403), (0, 0))
            ThreePointArc((0, 0), (1.018694482, 0.00475002), (2.037388964, 0))
        make_face()
    extrude(amount=13.186944818, mode=Mode.SUBTRACT)
    with BuildSketch(Plane(origin=(71.511245178, -6.20199849, 82.577126452), x_dir=(-0.4971059552935667, 0, -0.8676898462075434), z_dir=(0, 1, 0))) as filete1_2_piece_2:
        with BuildLine():
            CenterArc((2.457984349, -2), FILETE1_R, 90, 102.384853671)
            ThreePointArc((0.504526328, -2.428954266), (0.245367707, -1.215909412), (0, 0))
            Line((0, 0), (2.457984349, 0))
        make_face()
    extrude(amount=15.40399698, mode=Mode.SUBTRACT)

    # Esboço9 → Corte-extrusão3 (cut, through all)
    with BuildSketch(Plane(origin=(0, 3, 0), x_dir=(1, 0, 0), z_dir=(0, 1, 0))):
        with Locations(Location((75.866996657, -59.226515904, 0), (0, 0, 270))):
            Circle(ESBO_O9_R)
    extrude(amount=-CORTE_EXTRUS_O3_DEPTH, mode=Mode.SUBTRACT)

    # Chanfro2
    chanfro2_edges = [part.edges().sort_by_distance(p)[0] for p in [
        (75.866996657, 0, 57.426515904),
    ]]
    chamfer(chanfro2_edges, length=CHANFRO2_SIZE)


solid = part.part
